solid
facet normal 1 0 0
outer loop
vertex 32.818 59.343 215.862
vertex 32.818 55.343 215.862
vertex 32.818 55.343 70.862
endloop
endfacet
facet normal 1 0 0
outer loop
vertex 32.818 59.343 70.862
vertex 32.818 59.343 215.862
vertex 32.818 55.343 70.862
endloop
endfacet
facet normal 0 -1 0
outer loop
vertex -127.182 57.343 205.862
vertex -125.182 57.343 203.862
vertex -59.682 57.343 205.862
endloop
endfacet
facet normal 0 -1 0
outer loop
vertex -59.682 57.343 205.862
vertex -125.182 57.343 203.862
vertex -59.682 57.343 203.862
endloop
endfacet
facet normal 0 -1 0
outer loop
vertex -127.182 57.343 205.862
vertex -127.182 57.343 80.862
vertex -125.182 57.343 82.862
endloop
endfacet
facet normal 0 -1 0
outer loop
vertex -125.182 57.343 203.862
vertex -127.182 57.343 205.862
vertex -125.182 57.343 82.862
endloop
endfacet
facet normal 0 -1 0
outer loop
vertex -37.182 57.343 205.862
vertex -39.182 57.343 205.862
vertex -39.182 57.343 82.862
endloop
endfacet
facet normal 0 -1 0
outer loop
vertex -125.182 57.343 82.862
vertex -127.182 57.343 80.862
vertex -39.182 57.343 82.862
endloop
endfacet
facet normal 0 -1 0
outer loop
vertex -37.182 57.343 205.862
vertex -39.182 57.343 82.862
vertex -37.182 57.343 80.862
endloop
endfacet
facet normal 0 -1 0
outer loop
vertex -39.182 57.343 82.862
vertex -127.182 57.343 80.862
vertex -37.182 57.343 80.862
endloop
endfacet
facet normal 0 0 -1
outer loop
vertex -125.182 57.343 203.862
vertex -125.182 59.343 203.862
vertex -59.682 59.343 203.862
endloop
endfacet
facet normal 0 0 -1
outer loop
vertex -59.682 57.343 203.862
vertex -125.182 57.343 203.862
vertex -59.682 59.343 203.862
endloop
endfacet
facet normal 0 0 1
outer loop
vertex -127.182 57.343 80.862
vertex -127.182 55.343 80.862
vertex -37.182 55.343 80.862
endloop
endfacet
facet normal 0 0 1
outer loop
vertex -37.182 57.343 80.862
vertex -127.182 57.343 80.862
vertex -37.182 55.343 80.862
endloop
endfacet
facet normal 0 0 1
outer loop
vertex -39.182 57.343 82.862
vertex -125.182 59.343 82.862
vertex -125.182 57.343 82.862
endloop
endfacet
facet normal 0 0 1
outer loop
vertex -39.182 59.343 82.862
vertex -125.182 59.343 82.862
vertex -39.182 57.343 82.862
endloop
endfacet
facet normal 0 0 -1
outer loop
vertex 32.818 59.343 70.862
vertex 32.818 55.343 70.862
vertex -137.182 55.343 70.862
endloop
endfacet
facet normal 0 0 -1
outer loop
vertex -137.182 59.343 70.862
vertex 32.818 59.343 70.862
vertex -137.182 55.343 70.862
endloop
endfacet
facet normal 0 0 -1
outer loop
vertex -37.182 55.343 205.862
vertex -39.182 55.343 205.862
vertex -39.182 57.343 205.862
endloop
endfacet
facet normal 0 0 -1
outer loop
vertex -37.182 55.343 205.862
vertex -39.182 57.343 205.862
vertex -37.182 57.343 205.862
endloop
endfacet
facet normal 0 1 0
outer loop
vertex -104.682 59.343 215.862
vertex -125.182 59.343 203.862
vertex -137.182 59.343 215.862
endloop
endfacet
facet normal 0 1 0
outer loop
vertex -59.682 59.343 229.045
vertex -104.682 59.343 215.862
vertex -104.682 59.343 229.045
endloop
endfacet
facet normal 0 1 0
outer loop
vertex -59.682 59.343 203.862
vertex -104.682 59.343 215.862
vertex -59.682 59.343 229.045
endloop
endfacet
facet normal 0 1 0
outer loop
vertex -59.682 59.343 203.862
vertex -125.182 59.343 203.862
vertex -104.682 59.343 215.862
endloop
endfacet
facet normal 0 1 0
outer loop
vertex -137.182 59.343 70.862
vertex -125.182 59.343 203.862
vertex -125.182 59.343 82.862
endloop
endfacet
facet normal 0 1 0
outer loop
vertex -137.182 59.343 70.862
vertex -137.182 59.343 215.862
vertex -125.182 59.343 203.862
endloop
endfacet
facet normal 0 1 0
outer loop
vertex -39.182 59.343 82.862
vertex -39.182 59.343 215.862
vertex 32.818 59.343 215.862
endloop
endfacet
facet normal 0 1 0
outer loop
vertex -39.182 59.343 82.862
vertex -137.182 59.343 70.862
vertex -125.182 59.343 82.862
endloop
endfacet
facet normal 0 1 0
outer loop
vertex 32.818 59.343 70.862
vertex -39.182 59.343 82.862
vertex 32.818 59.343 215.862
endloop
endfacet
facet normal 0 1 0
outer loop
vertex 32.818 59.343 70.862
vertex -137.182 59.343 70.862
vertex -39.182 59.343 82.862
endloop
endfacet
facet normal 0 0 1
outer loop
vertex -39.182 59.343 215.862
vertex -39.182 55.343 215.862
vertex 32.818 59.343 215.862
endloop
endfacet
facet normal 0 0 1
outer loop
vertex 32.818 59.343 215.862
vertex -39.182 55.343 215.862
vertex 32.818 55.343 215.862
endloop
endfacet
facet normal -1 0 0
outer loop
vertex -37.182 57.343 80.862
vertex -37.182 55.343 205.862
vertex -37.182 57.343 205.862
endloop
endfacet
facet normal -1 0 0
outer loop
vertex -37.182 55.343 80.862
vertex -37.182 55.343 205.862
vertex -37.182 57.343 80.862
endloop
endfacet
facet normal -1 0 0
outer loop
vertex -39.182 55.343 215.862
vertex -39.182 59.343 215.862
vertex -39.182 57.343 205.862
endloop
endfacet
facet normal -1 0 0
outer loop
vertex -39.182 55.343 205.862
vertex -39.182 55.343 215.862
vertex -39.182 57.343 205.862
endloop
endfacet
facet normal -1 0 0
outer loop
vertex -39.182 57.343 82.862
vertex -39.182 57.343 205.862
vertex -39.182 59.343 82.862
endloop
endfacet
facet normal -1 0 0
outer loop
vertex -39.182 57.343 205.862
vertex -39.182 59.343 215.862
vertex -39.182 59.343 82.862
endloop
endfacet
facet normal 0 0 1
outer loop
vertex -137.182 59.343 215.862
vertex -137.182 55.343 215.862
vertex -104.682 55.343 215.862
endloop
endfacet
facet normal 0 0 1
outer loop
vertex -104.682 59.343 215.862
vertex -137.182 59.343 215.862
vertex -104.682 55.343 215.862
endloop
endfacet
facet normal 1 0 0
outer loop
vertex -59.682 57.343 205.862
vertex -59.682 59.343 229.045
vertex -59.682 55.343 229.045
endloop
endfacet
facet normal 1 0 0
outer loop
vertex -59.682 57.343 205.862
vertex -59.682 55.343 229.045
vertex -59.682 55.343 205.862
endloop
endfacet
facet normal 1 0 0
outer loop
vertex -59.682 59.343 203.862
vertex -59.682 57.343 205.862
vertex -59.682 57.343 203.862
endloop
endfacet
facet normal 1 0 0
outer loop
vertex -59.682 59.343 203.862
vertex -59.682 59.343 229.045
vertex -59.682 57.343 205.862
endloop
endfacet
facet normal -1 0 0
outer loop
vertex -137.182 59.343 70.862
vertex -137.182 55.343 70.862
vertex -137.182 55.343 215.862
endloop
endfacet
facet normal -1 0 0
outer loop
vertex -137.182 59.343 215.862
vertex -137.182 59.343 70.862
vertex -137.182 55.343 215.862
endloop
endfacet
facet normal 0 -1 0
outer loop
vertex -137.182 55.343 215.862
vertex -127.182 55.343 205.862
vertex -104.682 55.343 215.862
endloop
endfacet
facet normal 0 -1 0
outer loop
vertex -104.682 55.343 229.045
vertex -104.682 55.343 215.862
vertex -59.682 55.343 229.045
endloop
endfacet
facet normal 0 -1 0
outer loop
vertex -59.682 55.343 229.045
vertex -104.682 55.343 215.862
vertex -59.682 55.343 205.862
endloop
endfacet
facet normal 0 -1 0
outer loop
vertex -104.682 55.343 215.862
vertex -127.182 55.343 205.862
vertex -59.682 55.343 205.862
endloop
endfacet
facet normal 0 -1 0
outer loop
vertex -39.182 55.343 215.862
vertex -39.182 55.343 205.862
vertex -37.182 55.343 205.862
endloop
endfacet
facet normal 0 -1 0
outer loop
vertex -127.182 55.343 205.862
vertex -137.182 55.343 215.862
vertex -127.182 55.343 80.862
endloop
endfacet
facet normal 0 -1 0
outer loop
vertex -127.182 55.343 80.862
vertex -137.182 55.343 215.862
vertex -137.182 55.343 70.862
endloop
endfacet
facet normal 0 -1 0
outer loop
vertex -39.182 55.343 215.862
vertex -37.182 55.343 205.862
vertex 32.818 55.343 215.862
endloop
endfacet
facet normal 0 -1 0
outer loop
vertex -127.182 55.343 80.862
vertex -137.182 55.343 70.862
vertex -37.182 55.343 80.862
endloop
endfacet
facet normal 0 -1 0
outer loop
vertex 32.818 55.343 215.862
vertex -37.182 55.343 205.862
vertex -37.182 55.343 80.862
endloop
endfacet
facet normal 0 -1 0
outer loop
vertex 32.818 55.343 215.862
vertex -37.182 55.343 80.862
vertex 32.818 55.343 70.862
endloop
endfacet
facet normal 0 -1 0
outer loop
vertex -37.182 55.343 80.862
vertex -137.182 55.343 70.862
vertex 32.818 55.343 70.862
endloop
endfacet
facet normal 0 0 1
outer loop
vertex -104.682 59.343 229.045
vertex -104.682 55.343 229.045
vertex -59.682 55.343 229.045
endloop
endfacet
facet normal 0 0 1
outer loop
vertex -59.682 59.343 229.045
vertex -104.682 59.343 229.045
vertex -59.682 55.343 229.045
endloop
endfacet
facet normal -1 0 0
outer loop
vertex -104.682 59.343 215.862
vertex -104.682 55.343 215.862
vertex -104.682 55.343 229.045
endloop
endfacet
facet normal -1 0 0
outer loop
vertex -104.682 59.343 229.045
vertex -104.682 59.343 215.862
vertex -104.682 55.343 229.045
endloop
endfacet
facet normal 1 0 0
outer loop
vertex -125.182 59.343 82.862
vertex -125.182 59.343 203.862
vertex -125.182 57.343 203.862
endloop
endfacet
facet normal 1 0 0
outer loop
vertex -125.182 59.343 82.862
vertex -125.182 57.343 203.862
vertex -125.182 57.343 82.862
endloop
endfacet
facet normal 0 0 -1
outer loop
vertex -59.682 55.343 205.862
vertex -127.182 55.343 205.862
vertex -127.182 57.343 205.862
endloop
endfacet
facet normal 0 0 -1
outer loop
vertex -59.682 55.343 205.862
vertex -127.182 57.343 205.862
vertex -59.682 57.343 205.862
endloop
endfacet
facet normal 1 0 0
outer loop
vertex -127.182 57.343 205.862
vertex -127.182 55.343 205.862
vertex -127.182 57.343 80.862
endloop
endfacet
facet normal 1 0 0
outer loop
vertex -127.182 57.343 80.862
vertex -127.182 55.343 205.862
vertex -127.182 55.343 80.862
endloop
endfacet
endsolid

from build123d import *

# Parameters (mm, degrees)
SKETCH1_W           = 90
SKETCH1_H           = 125
BOSS_EXTRUDE1_DEPTH = 4
SKETCH2_W           = 90
SKETCH2_H           = 125
SKETCH2_W_2         = 86
SKETCH2_H_2         = 121
BOSS_EXTRUDE2_DEPTH = 2
SKETCH3_W           = 20.5
SKETCH3_H           = 12
CUT_EXTRUDE1_DEPTH  = 10


with BuildPart() as part:
    # Sketch1 → Boss-Extrude1 (new body)
    with BuildSketch(Plane(origin=(0, 55.343226389, 0), x_dir=(1, 0, 0), z_dir=(0, 1, 0))):
        Polygon((-104.681843773, -215.861584775), (-104.681843773, -229.045240407), (-59.681843773, -229.045240407), (-59.681843773, -215.861584775), (32.818156227, -215.861584775), (32.818156227, -70.861584775), (-137.181843773, -70.861584775), (-137.181843773, -215.861584775), align=None)
        with Locations((-82.181843773, -143.361584775)):
            Rectangle(SKETCH1_W, SKETCH1_H, mode=Mode.SUBTRACT)
    extrude(amount=BOSS_EXTRUDE1_DEPTH)

    # Sketch2 → Boss-Extrude2 (add)
    with BuildSketch(Plane(origin=(0, 59.343226389, 0), x_dir=(1, 0, 0), z_dir=(0, 1, 0))):
        with Locations((-82.181843773, -143.361584775)):
            Rectangle(SKETCH2_W, SKETCH2_H)
        with Locations((-82.181843773, -143.361584775)):
            Rectangle(SKETCH2_W_2, SKETCH2_H_2, mode=Mode.SUBTRACT)
    extrude(amount=-BOSS_EXTRUDE2_DEPTH)

    # Sketch3 → Cut-Extrude1 (cut)
    with BuildSketch(Plane(origin=(0, 59.343226389, 0), x_dir=(1, 0, 0), z_dir=(0, 1, 0))):
        with Locations((-49.431843773, -209.861584775)):
            Rectangle(SKETCH3_W, SKETCH3_H)
    extrude(amount=-CUT_EXTRUDE1_DEPTH, mode=Mode.SUBTRACT)


solid = part.part
